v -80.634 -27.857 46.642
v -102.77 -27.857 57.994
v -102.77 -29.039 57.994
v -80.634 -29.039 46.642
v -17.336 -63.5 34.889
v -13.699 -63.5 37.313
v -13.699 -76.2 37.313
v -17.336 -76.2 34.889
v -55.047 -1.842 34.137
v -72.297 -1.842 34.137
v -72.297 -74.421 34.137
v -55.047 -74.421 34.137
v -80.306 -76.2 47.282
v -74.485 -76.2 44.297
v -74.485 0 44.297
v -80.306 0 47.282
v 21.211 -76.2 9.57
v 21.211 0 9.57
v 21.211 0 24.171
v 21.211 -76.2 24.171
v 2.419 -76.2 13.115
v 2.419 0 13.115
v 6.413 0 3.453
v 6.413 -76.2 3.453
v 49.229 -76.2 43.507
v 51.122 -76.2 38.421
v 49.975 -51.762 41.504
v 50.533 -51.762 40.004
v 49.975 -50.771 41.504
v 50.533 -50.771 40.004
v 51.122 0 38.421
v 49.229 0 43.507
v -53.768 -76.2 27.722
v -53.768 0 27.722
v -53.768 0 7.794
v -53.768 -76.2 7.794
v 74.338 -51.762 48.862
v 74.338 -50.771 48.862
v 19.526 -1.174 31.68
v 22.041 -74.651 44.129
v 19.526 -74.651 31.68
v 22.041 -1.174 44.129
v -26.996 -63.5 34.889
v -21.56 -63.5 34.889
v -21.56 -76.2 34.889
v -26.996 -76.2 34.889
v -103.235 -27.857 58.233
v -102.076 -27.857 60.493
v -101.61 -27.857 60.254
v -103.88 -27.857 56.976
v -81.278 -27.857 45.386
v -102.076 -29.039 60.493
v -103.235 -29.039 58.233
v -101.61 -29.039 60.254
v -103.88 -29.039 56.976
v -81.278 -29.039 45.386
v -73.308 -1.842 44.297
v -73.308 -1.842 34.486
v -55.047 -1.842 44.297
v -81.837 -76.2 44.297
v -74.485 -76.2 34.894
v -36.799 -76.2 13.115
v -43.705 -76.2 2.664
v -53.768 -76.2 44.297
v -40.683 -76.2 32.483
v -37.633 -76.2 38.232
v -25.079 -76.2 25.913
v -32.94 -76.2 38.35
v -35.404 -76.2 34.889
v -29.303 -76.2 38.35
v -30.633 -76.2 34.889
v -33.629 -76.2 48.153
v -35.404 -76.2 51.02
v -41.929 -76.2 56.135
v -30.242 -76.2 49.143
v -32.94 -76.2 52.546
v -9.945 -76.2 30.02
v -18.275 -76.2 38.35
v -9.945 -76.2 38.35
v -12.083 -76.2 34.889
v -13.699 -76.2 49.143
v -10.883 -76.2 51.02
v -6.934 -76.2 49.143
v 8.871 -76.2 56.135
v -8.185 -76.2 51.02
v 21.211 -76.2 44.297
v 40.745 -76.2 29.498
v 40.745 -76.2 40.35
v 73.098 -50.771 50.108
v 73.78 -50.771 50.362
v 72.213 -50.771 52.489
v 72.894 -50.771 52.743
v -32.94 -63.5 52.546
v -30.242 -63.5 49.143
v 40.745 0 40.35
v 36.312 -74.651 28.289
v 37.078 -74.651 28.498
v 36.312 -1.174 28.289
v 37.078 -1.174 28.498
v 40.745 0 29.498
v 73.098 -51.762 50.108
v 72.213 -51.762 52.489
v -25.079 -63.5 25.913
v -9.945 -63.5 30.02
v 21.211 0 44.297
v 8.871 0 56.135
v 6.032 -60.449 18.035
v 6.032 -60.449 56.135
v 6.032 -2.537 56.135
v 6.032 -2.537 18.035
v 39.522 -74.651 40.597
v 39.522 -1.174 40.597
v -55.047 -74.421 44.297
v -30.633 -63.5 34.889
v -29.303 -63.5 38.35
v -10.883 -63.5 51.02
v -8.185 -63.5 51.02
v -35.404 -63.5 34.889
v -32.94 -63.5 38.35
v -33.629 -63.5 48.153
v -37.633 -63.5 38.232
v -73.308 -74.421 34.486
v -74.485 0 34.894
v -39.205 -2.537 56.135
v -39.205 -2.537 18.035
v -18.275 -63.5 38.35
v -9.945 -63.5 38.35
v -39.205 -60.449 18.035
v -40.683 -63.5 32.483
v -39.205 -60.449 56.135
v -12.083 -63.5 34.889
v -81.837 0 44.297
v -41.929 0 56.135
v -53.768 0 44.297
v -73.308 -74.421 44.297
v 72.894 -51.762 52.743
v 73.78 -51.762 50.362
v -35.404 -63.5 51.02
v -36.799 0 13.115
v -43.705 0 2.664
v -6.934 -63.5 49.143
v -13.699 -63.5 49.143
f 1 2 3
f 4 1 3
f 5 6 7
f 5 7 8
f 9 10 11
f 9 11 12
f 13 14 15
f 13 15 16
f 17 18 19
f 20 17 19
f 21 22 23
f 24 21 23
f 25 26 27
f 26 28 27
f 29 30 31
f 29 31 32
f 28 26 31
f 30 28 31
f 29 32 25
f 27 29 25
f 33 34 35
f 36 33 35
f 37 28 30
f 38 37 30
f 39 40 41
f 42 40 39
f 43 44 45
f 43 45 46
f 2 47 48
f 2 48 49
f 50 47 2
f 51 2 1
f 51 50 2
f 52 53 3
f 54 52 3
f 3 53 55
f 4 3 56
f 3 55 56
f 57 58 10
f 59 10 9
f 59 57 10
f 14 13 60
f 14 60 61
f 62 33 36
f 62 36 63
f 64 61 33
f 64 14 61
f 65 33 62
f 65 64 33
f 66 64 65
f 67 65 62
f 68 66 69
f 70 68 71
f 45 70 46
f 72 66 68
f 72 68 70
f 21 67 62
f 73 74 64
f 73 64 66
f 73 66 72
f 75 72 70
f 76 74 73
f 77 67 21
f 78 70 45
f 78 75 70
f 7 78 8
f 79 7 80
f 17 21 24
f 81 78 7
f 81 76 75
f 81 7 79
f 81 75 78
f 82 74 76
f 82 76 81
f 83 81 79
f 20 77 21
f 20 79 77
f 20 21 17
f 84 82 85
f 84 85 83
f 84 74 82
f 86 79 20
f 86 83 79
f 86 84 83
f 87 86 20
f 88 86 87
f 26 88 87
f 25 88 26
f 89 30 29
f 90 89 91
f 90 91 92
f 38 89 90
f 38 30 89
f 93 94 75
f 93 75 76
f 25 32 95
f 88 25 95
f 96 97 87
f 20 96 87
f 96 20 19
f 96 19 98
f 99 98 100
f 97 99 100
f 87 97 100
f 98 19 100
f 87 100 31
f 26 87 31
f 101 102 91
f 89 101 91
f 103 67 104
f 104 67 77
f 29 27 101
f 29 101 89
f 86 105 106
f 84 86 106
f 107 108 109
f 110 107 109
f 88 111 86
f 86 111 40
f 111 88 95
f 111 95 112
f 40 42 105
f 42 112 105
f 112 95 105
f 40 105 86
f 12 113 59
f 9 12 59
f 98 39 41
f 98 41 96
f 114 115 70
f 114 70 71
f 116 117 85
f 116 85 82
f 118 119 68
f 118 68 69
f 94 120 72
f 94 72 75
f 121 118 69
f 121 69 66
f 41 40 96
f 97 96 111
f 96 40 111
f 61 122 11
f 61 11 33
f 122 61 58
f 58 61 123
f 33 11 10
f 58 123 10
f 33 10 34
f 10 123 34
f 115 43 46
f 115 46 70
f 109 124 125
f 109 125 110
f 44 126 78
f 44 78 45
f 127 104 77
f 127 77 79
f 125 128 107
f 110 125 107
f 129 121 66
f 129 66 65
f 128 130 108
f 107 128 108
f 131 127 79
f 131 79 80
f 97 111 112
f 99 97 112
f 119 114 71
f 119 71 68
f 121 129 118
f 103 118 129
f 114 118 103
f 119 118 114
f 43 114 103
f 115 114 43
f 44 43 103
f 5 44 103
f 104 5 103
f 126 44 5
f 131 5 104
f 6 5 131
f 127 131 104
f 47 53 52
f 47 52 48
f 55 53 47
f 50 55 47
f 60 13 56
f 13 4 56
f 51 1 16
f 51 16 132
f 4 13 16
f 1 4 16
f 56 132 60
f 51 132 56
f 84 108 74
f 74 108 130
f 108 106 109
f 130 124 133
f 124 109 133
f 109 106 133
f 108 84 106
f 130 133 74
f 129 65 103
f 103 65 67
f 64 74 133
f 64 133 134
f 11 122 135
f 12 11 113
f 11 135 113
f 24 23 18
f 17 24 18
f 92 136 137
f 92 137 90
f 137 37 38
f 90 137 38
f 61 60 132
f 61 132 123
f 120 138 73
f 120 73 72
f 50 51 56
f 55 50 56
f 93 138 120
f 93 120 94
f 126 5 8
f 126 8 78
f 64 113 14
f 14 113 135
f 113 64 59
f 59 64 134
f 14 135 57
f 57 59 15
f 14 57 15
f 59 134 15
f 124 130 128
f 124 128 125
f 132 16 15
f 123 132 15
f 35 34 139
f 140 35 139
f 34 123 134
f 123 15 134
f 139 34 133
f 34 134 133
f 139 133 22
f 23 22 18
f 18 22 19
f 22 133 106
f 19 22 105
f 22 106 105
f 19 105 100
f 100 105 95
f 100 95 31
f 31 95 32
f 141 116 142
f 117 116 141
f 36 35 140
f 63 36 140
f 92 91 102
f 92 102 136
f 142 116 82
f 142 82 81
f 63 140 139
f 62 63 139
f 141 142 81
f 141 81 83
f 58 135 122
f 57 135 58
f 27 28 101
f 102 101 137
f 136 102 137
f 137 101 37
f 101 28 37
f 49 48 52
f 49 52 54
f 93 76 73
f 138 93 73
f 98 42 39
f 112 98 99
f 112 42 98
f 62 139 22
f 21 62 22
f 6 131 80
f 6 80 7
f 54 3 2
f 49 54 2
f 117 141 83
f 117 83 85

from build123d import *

# Parameters (mm, degrees)
F1_DEPTH  = 76.2
F2_W      = 45.2374
F2_H      = 57.912
F3_DEPTH  = 38.1
F4_W      = 0.9906
F4_H      = 1.6002
F5_DEPTH  = 25.4
F6_W      = 0.7274897046
F6_H      = 0.9906
F7_DEPTH  = 2.54
F8_W      = 1.1825356632
F8_H      = 1.4120219275
F9_DEPTH  = 25.4
F10_W     = 0.5234003049
F10_H     = 1.1825356632
F11_DEPTH = 2.54
F13_DEPTH = 12.7
F14_W     = 17.834963277
F14_H     = 73.4775259625
F15_DEPTH = 12.7
F16_W     = 18.2606615126
F16_H     = 72.5786741823
F17_DEPTH = 10.16


with BuildPart() as f1:
    # F0 (on Front) → F1 (new body)
    with BuildSketch(Plane.XZ):
        Polygon((8.871205765, 56.1352521181), (-41.928794235, 56.1352521181), (-53.7675097585, 44.2965365946), (-74.4852647185, 44.2965365946), (-80.3059687692, 47.2815136811), (-81.8367265829, 44.2965365946), (-74.4852647185, 34.8938606037), (-53.7675097585, 27.7223307639), (-53.7675097585, 7.7938223258), (-43.7045991421, 2.6637113187), (-36.7986820638, 13.1148345131), (2.4190642002, 13.1148345131), (6.4126392826, 3.4529594705), (21.2110355496, 9.5696300268), (21.2110355496, 24.1707172245), (40.7449230552, 29.4981393963), (51.1220302522, 38.4206696416), (49.2293350399, 43.5072891414), (40.7449230552, 40.3502993286), (21.2110355496, 44.2965365946), align=None)
    extrude(amount=F1_DEPTH)

    # F2 (on face) → F3 (cut)
    with BuildSketch(Plane.XY.offset(56.1352521181)):
        with Locations((-16.5863556839, -31.4929929974)):
            Rectangle(F2_W, F2_H)
    extrude(amount=-F3_DEPTH, mode=Mode.SUBTRACT)

    # F4 (on face) → F5 (join)
    with BuildSketch(Plane(origin=(57.4622590525, 0, 21.381301), x_dir=(0, 1, 0), z_dir=(0.9372218761, 0, 0.3487336448))):
        with Locations((-51.2663501552, 20.6706811054)):
            Rectangle(F4_W, F4_H)
    extrude(amount=F5_DEPTH)

    # F6 (on face) → F7 (join)
    with BuildSketch(Plane(origin=(-7.487583751, 0, 20.1228857485), x_dir=(0.9372218761, 0, 0.3487336448), z_dir=(-0.3487336448, 0, 0.9372218761))):
        with Locations((86.3475204084, -51.2663501552)):
            Rectangle(F6_W, F6_H)
    extrude(amount=F7_DEPTH)

    # F8 (on face) → F9 (join)
    with BuildSketch(Plane(origin=(-82.7823804145, 0, 42.4525120249), x_dir=(0, -1, 0), z_dir=(-0.8898174224, 0, 0.4563167263))):
        with Locations((28.4478189424, 4.0023266338)):
            Rectangle(F8_W, F8_H)
    extrude(amount=F9_DEPTH)

    # F10 (on face) → F11 (join)
    with BuildSketch(Plane(origin=(2.1484931989, 0, 4.1895608251), x_dir=(0.8898174224, 0, -0.4563167263), z_dir=(0.4563167263, 0, 0.8898174224))):
        with Locations((-118.1712955227, -28.4478189424)):
            Rectangle(F10_W, F10_H)
    extrude(amount=F11_DEPTH)

    # F12 (on face) → F13 (cut)
    with BuildSketch(Plane.XZ.offset(76.2)):
        Polygon((-35.403739661, 34.8885591957), (-37.6328639686, 38.2322445512), (-40.683247149, 32.4834473431), (-25.0793676823, 25.9133949876), (-9.9447797984, 30.0196781754), (-9.9447797984, 38.3495688438), (-12.0826530857, 34.8885591957), (-13.6990956962, 37.3132223095), (-17.336089164, 34.8885591957), (-18.2746686041, 38.3495688438), (-21.5596966445, 34.8885591957), (-26.9956346343, 34.8885591957), (-29.3029751629, 38.3495688438), (-30.6326299647, 34.8885591957), (-32.9399704933, 38.3495688438), align=None)
        Polygon((-30.241554603, 49.1432286799), (-32.9399704933, 52.5455772877), (-35.403739661, 51.0203875601), (-33.6285175147, 48.1527196821), align=None)
        Polygon((-8.1849442795, 51.0203875601), (-10.8833583072, 51.0203875601), (-13.6990956962, 49.1432286799), (-6.9335046121, 49.1432286799), align=None)
    extrude(amount=-F13_DEPTH, mode=Mode.SUBTRACT)

    # F14 (on face) → F15 (cut)
    with BuildSketch(Plane(origin=(9.429613944, 0, 46.6766201788), x_dir=(0.9801980455, 0, -0.198019675), z_dir=(0.198019675, 0, 0.9801980455))):
        with Locations((21.7831684276, -37.9125081236)):
            Rectangle(F14_W, F14_H)
    extrude(amount=-F15_DEPTH, mode=Mode.SUBTRACT)

    # F16 (on face) → F17 (cut)
    with BuildSketch(Plane.XY.offset(44.2965365946)):
        with Locations((-64.177474007, -38.1315993145)):
            Rectangle(F16_W, F16_H)
    extrude(amount=-F17_DEPTH, mode=Mode.SUBTRACT)


solid = f1.part
